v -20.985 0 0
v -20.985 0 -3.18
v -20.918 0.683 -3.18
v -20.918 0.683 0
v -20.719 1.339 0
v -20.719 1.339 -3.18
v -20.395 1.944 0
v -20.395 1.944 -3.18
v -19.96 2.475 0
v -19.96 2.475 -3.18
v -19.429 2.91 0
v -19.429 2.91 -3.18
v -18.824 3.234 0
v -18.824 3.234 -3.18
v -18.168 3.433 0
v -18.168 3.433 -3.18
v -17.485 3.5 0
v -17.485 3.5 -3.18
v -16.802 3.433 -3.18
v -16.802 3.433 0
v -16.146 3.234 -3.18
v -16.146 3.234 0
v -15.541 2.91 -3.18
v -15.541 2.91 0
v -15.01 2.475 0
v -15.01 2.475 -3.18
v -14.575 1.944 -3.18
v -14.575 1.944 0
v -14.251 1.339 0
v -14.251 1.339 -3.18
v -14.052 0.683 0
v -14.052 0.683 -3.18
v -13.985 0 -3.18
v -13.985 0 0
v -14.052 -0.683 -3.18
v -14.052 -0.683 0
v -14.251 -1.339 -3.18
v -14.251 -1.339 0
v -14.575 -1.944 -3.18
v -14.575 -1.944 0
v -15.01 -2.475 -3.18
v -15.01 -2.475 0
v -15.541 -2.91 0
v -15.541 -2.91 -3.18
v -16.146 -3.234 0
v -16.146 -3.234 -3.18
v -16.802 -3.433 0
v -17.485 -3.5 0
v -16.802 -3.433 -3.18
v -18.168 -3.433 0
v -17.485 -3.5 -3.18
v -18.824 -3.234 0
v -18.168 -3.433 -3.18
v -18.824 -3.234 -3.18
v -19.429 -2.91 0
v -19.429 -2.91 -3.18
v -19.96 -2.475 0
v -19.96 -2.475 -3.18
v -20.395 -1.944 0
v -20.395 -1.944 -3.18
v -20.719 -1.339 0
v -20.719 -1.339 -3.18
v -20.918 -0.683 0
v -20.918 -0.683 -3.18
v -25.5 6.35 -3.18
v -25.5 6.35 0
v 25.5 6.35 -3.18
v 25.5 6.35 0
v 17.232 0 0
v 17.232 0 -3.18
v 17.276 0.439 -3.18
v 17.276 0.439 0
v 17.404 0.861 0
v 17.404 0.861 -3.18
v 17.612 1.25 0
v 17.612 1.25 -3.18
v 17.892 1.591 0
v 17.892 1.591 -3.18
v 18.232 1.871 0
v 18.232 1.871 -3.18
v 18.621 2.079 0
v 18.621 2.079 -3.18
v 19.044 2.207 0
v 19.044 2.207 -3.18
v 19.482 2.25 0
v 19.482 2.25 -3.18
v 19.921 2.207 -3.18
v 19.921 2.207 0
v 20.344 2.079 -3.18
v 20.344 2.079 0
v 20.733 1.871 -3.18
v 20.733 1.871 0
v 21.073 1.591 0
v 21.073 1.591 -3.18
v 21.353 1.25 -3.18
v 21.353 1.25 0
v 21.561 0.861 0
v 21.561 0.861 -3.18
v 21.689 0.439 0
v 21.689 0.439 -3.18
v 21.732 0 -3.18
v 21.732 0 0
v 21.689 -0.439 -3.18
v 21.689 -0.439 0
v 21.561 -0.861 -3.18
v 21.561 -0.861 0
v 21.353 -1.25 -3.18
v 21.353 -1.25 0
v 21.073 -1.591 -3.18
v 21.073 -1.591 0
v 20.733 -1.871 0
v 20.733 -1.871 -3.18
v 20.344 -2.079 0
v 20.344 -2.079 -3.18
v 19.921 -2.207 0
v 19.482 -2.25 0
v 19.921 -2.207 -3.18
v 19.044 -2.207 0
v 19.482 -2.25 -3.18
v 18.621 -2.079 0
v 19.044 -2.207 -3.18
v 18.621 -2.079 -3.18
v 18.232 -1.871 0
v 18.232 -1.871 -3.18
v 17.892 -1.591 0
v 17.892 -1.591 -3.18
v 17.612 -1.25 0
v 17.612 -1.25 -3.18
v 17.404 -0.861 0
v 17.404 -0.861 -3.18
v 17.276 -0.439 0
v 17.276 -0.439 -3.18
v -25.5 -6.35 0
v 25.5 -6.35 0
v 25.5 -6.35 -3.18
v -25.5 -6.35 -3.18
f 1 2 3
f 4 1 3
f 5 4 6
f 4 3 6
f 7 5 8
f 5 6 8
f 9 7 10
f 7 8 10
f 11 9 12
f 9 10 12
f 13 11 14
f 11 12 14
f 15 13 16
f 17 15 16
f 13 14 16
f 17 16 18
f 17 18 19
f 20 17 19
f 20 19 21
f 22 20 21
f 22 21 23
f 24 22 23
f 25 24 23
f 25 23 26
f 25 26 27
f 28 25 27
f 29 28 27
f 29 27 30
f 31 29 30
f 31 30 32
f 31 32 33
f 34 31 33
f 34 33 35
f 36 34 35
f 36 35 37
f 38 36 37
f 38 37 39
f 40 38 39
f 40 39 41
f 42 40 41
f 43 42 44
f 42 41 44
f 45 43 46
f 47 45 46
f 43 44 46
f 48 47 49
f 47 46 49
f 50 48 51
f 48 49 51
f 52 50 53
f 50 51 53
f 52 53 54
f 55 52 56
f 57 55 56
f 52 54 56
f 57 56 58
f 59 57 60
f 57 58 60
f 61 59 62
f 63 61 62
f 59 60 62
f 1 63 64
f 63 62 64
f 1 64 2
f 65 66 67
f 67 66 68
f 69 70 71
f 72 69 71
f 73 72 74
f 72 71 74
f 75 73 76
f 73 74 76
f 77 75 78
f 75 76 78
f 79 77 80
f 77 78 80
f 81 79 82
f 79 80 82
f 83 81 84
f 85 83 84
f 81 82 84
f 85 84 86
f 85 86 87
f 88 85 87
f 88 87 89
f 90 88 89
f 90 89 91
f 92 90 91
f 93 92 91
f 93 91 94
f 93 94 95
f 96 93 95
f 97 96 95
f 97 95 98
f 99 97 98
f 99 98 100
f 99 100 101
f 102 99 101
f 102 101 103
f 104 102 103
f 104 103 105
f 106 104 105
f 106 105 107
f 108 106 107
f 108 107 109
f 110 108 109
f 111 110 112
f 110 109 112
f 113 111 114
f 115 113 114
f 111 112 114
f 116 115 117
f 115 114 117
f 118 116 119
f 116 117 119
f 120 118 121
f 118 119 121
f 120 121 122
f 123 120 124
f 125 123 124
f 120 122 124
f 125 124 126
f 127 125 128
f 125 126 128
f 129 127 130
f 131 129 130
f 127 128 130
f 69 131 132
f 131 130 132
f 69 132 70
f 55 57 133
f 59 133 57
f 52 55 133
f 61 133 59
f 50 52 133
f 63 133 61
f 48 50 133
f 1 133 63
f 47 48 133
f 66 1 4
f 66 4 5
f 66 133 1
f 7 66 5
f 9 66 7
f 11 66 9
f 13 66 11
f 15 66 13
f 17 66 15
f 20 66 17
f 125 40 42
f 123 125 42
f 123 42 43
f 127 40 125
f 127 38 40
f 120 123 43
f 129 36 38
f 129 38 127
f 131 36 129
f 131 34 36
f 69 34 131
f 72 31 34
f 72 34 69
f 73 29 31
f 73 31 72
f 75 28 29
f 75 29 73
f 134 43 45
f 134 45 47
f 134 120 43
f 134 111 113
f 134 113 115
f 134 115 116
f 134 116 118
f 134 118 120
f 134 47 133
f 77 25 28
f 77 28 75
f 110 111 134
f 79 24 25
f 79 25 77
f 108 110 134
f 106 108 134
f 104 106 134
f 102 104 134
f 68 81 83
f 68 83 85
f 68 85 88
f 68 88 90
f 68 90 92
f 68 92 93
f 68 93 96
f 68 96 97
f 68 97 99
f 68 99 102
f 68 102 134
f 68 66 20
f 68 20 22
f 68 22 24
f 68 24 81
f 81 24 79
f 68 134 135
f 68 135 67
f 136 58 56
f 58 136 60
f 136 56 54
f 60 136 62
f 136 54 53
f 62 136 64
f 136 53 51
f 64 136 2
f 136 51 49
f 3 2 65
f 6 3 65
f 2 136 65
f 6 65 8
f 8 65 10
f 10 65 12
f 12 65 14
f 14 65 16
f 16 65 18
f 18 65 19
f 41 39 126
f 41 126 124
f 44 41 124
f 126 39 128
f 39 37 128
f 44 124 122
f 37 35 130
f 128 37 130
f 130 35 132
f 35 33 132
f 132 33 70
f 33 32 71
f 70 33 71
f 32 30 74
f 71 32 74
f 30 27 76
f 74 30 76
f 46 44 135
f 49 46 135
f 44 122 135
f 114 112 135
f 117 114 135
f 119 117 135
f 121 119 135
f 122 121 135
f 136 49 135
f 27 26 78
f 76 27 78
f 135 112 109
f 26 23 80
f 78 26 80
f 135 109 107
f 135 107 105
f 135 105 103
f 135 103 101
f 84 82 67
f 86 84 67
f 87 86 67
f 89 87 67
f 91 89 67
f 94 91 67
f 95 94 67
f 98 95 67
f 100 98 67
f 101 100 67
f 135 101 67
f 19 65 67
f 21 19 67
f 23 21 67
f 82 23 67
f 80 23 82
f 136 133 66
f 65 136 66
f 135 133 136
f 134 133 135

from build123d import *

# Parameters (mm, degrees)
ESBO_O1_W             = 51
ESBO_O1_H             = 12.7
FLANGE_BASE1_DEPTH    = 3.18
ESBO_O2_R             = 3.5
ESBO_O2_R_2           = 2.25
CORTE_EXTRUS_O1_DEPTH = 10


# Sheet-metal steps are written as plain solids
with BuildPart() as part:
    # Esboço1 → Flange-base1 (new body)
    with BuildSketch(Plane.XY):
        Rectangle(ESBO_O1_W, ESBO_O1_H)
    extrude(amount=-FLANGE_BASE1_DEPTH)

    # Esboço2 → Corte-extrusão1 (cut)
    with BuildSketch(Plane(origin=(0, 0, -3.18), x_dir=(-1, 0, 0), z_dir=(0, 0, -1))):
        with Locations((17.485, 0)):
            Circle(ESBO_O2_R)
        with Locations((-19.4825, 0)):
            Circle(ESBO_O2_R_2)
    extrude(amount=-CORTE_EXTRUS_O1_DEPTH, mode=Mode.SUBTRACT)


solid = part.part
